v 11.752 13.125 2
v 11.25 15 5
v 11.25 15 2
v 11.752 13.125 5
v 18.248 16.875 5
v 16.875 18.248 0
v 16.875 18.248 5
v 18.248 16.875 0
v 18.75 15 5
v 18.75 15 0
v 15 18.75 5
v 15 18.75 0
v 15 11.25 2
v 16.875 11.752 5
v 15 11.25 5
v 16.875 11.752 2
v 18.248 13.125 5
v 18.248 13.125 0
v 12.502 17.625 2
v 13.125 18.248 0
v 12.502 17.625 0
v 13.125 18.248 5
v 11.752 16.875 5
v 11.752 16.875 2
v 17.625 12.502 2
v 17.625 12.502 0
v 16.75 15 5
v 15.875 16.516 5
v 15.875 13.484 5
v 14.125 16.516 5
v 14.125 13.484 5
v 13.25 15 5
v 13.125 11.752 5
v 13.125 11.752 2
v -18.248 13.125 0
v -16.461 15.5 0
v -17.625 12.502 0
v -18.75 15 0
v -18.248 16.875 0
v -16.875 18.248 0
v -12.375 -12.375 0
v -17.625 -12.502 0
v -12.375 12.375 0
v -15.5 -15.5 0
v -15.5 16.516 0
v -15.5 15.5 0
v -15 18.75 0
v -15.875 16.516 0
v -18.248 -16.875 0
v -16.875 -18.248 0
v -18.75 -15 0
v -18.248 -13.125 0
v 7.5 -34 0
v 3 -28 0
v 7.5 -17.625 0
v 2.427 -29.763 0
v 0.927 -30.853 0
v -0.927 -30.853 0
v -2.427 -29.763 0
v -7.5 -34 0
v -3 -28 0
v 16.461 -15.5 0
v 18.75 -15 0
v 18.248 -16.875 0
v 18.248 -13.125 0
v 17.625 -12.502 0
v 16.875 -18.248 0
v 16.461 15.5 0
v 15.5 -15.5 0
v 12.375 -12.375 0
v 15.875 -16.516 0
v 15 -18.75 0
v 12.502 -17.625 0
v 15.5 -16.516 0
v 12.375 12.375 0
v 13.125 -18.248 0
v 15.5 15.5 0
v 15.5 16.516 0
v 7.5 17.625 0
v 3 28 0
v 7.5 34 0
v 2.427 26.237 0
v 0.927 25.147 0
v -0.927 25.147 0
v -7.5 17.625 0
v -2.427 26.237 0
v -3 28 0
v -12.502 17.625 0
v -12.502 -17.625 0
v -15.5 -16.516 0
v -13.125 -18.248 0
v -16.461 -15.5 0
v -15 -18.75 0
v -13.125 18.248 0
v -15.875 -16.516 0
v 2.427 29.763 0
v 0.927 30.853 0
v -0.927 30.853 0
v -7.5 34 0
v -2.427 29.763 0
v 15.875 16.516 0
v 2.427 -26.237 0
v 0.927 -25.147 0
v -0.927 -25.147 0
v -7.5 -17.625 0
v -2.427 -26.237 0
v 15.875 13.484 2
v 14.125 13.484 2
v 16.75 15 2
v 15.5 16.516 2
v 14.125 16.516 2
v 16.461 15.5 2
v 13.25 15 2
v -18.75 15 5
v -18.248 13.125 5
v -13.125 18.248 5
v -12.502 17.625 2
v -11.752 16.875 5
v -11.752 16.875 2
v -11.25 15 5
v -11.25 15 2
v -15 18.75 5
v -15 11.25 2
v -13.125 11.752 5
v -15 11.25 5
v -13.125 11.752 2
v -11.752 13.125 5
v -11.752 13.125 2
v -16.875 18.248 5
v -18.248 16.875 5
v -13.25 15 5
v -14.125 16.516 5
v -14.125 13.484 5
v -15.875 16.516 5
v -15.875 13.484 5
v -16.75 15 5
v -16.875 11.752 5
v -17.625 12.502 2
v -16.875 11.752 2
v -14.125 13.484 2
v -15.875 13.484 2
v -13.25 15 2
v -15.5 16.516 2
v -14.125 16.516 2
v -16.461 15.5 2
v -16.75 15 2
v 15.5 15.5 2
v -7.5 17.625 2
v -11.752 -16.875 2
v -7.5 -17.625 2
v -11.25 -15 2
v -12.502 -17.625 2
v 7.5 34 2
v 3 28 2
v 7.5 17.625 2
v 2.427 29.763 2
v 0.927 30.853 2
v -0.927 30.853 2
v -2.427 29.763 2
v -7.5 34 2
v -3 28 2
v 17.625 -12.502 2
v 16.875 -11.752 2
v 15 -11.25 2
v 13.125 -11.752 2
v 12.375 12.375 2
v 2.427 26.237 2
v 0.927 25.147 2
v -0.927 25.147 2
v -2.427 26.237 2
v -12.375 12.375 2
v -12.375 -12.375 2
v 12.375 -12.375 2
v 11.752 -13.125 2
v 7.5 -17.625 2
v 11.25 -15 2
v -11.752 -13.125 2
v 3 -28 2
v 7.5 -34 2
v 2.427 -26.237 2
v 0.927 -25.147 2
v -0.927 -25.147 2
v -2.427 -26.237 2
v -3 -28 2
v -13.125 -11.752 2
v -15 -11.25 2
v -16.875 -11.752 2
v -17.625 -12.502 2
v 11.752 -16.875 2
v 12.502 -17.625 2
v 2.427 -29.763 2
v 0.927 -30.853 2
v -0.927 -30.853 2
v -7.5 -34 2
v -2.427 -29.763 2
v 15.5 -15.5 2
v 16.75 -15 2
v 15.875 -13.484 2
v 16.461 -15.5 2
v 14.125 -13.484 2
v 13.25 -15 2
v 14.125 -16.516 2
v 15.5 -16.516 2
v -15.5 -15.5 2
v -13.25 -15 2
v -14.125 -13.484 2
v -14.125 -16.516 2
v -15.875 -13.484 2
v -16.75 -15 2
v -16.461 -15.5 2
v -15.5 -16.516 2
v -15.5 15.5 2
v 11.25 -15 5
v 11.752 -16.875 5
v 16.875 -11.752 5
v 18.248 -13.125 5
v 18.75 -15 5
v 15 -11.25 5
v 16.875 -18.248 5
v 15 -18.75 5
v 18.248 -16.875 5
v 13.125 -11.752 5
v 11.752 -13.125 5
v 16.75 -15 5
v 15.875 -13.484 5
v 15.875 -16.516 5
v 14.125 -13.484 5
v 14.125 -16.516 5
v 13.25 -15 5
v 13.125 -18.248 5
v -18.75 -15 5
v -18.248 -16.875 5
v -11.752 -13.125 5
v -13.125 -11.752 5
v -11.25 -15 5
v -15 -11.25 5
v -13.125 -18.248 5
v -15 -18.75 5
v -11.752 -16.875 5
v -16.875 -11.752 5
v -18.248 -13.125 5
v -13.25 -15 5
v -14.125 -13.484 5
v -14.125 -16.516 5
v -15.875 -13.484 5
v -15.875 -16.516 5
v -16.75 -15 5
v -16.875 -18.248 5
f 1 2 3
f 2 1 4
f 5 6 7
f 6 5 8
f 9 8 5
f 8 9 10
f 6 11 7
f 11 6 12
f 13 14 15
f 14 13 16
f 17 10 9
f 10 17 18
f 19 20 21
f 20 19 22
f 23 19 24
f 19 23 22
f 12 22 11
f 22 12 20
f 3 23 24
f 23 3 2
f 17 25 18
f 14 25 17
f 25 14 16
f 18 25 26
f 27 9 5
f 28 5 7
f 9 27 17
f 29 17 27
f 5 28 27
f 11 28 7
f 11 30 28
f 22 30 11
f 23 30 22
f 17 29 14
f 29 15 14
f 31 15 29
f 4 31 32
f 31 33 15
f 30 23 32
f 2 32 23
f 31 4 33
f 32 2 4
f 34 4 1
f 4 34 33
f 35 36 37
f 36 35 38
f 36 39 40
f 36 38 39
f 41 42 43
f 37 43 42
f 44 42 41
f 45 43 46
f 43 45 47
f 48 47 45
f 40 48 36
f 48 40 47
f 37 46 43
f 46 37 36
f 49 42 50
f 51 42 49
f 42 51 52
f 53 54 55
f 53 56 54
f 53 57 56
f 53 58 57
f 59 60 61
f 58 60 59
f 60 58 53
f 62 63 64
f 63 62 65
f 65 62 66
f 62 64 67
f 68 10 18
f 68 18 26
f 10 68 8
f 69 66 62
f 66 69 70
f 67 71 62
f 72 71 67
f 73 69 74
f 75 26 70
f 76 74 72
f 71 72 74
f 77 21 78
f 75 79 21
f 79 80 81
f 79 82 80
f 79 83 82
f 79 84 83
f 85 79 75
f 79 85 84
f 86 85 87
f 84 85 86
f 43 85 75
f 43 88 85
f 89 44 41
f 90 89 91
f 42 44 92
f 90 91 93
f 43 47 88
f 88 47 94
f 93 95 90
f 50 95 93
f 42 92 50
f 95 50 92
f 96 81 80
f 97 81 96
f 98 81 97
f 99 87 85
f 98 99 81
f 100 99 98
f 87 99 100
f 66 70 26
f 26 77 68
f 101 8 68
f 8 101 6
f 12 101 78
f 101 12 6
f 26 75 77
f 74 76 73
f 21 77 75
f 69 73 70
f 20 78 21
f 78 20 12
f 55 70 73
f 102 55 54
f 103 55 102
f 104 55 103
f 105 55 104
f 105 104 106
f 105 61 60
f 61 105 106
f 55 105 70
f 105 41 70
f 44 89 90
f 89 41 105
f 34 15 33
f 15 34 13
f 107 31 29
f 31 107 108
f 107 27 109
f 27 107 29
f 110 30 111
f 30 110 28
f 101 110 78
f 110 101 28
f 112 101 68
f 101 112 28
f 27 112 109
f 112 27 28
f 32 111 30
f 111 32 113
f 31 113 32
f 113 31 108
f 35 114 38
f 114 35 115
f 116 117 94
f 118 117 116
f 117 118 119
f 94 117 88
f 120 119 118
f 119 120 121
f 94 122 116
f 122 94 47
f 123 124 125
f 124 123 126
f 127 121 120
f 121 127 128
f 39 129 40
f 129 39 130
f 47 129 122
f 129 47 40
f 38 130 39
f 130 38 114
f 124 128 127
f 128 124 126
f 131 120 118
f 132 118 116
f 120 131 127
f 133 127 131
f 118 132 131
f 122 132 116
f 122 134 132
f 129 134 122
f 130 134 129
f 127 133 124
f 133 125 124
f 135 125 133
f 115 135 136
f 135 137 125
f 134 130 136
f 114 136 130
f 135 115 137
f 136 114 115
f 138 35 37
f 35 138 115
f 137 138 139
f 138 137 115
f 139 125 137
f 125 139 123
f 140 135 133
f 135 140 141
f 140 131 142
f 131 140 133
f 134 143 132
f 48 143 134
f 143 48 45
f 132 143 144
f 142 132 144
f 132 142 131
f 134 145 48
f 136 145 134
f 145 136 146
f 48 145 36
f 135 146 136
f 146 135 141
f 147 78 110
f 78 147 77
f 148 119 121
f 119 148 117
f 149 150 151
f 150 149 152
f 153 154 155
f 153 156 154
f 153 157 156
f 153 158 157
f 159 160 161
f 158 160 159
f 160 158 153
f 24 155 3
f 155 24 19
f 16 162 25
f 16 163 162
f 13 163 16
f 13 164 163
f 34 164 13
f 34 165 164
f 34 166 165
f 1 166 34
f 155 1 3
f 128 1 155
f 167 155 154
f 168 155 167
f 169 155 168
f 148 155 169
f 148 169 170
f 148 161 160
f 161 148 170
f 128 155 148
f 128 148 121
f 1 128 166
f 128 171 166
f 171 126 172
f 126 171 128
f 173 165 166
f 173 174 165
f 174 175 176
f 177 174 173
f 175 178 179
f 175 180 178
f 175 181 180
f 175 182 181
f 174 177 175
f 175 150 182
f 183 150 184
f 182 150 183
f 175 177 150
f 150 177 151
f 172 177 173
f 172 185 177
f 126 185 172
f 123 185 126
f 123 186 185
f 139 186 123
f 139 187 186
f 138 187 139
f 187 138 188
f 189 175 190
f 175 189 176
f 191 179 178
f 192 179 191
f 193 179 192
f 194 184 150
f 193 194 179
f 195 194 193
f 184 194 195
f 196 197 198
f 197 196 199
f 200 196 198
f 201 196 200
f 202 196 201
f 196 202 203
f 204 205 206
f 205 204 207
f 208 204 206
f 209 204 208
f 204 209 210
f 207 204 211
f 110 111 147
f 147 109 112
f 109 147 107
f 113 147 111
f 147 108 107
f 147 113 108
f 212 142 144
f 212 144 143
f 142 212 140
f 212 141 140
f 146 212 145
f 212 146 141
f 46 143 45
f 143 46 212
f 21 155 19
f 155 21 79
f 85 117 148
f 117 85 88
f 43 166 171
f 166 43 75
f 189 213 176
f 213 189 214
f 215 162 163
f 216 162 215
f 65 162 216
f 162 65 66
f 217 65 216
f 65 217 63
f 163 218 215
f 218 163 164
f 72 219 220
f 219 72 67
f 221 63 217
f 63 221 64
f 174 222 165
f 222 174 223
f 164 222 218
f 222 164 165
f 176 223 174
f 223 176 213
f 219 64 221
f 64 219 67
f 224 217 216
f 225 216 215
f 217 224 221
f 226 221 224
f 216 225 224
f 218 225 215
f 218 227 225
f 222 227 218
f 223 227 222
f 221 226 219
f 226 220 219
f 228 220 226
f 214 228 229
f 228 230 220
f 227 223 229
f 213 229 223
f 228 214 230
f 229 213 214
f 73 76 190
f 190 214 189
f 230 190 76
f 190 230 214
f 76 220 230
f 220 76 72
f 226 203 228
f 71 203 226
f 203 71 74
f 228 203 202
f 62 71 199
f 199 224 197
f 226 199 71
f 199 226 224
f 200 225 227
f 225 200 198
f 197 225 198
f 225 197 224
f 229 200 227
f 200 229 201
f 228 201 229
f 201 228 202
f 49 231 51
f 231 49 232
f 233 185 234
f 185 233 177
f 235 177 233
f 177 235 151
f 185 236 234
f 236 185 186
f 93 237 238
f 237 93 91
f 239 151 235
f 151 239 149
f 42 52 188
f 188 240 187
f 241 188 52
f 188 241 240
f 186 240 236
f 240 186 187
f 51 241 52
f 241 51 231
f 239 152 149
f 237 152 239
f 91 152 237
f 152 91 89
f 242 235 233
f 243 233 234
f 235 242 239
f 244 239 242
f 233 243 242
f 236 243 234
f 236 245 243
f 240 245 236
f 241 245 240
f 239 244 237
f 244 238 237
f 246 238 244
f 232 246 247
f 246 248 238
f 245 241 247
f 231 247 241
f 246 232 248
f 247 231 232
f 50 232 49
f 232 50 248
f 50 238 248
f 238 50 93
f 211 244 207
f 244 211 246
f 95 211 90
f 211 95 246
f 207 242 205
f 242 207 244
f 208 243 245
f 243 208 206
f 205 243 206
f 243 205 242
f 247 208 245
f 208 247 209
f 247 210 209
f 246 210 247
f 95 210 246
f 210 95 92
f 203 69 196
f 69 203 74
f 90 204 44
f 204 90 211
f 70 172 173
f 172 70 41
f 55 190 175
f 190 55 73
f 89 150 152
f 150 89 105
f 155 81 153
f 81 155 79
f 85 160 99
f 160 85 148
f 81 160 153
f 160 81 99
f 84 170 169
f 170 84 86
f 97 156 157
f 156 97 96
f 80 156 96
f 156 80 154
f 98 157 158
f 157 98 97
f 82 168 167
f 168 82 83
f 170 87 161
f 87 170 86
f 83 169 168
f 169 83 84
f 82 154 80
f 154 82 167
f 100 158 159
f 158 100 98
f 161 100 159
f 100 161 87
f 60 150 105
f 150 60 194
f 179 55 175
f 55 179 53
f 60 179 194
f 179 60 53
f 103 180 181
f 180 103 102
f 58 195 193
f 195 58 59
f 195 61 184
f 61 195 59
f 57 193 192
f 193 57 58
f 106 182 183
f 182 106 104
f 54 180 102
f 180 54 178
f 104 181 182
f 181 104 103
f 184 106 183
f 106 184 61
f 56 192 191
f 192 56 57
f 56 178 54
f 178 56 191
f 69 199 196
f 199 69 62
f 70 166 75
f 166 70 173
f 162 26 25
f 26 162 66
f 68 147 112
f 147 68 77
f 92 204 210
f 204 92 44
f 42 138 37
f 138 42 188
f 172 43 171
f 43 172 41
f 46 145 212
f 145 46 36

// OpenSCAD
base_x = 30; //[5:100]
base_y = 30; //[5:100]
screw_od = 3.5000000000; //.5
offset = 5; //.5

union() {
	translate(v = [0, (base_y / 2), 0]) {
		union() {
			translate(v = [0, 0, 1.0000000000]) {
				cube(center = true, size = [(base_x + 1.0), (screw_od * 1.5), 2]);
			}
			translate(v = [(base_x / 2), 0, 0]) {
				difference() {
					cylinder(d = (screw_od + 4), h = offset);
					translate(v = [0, 0, (-(offset / 2))]) {
						cylinder(d = screw_od, h = (2 * offset));
					}
				}
			}
			translate(v = [(-(base_x / 2)), 0, 0]) {
				difference() {
					cylinder(d = (screw_od + 4), h = offset);
					translate(v = [0, 0, (-(offset / 2))]) {
						cylinder(d = screw_od, h = (2 * offset));
					}
				}
			}
		}
	}
	translate(v = [0, (-(base_y / 2)), 0]) {
		union() {
			translate(v = [0, 0, 1.0000000000]) {
				cube(center = true, size = [(base_x + 1.0), (screw_od * 1.5), 2]);
			}
			translate(v = [(base_x / 2), 0, 0]) {
				difference() {
					cylinder(d = (screw_od + 4), h = offset);
					translate(v = [0, 0, (-(offset / 2))]) {
						cylinder(d = screw_od, h = (2 * offset));
					}
				}
			}
			translate(v = [(-(base_x / 2)), 0, 0]) {
				difference() {
					cylinder(d = (screw_od + 4), h = offset);
					translate(v = [0, 0, (-(offset / 2))]) {
						cylinder(d = screw_od, h = (2 * offset));
					}
				}
			}
		}
	}
	translate(v = [(base_x / 2), 0, 0]) {
		rotate(a = [0, 0, 90]) {
			translate(v = [0, 0, 1.0000000000]) {
				cube(center = true, size = [(base_y + 1.0), (screw_od * 1.5), 2]);
			}
		}
	}
	translate(v = [(-(base_x / 2)), 0, 0]) {
		rotate(a = [0, 0, 90]) {
			translate(v = [0, 0, 1.0000000000]) {
				cube(center = true, size = [(base_y + 1.0), (screw_od * 1.5), 2]);
			}
		}
	}
	translate(v = [0, (((base_y / 2) + 10.0) - 1.0), 0]) {
		difference() {
			translate(v = [0, 0, 1.0000000000]) {
				cube(center = true, size = [15, 20, 2]);
			}
			translate(v = [0, 4.0000000000, 0]) {
				cylinder(d = 6, h = 20);
			}
		}
	}
	translate(v = [0, (-(((base_y / 2) + 10.0) - 1.0)), 0]) {
		rotate(a = [0, 0, 180]) {
			difference() {
				translate(v = [0, 0, 1.0000000000]) {
					cube(center = true, size = [15, 20, 2]);
				}
				translate(v = [0, 4.0000000000, 0]) {
					cylinder(d = 6, h = 20);
				}
			}
		}
	}
}
